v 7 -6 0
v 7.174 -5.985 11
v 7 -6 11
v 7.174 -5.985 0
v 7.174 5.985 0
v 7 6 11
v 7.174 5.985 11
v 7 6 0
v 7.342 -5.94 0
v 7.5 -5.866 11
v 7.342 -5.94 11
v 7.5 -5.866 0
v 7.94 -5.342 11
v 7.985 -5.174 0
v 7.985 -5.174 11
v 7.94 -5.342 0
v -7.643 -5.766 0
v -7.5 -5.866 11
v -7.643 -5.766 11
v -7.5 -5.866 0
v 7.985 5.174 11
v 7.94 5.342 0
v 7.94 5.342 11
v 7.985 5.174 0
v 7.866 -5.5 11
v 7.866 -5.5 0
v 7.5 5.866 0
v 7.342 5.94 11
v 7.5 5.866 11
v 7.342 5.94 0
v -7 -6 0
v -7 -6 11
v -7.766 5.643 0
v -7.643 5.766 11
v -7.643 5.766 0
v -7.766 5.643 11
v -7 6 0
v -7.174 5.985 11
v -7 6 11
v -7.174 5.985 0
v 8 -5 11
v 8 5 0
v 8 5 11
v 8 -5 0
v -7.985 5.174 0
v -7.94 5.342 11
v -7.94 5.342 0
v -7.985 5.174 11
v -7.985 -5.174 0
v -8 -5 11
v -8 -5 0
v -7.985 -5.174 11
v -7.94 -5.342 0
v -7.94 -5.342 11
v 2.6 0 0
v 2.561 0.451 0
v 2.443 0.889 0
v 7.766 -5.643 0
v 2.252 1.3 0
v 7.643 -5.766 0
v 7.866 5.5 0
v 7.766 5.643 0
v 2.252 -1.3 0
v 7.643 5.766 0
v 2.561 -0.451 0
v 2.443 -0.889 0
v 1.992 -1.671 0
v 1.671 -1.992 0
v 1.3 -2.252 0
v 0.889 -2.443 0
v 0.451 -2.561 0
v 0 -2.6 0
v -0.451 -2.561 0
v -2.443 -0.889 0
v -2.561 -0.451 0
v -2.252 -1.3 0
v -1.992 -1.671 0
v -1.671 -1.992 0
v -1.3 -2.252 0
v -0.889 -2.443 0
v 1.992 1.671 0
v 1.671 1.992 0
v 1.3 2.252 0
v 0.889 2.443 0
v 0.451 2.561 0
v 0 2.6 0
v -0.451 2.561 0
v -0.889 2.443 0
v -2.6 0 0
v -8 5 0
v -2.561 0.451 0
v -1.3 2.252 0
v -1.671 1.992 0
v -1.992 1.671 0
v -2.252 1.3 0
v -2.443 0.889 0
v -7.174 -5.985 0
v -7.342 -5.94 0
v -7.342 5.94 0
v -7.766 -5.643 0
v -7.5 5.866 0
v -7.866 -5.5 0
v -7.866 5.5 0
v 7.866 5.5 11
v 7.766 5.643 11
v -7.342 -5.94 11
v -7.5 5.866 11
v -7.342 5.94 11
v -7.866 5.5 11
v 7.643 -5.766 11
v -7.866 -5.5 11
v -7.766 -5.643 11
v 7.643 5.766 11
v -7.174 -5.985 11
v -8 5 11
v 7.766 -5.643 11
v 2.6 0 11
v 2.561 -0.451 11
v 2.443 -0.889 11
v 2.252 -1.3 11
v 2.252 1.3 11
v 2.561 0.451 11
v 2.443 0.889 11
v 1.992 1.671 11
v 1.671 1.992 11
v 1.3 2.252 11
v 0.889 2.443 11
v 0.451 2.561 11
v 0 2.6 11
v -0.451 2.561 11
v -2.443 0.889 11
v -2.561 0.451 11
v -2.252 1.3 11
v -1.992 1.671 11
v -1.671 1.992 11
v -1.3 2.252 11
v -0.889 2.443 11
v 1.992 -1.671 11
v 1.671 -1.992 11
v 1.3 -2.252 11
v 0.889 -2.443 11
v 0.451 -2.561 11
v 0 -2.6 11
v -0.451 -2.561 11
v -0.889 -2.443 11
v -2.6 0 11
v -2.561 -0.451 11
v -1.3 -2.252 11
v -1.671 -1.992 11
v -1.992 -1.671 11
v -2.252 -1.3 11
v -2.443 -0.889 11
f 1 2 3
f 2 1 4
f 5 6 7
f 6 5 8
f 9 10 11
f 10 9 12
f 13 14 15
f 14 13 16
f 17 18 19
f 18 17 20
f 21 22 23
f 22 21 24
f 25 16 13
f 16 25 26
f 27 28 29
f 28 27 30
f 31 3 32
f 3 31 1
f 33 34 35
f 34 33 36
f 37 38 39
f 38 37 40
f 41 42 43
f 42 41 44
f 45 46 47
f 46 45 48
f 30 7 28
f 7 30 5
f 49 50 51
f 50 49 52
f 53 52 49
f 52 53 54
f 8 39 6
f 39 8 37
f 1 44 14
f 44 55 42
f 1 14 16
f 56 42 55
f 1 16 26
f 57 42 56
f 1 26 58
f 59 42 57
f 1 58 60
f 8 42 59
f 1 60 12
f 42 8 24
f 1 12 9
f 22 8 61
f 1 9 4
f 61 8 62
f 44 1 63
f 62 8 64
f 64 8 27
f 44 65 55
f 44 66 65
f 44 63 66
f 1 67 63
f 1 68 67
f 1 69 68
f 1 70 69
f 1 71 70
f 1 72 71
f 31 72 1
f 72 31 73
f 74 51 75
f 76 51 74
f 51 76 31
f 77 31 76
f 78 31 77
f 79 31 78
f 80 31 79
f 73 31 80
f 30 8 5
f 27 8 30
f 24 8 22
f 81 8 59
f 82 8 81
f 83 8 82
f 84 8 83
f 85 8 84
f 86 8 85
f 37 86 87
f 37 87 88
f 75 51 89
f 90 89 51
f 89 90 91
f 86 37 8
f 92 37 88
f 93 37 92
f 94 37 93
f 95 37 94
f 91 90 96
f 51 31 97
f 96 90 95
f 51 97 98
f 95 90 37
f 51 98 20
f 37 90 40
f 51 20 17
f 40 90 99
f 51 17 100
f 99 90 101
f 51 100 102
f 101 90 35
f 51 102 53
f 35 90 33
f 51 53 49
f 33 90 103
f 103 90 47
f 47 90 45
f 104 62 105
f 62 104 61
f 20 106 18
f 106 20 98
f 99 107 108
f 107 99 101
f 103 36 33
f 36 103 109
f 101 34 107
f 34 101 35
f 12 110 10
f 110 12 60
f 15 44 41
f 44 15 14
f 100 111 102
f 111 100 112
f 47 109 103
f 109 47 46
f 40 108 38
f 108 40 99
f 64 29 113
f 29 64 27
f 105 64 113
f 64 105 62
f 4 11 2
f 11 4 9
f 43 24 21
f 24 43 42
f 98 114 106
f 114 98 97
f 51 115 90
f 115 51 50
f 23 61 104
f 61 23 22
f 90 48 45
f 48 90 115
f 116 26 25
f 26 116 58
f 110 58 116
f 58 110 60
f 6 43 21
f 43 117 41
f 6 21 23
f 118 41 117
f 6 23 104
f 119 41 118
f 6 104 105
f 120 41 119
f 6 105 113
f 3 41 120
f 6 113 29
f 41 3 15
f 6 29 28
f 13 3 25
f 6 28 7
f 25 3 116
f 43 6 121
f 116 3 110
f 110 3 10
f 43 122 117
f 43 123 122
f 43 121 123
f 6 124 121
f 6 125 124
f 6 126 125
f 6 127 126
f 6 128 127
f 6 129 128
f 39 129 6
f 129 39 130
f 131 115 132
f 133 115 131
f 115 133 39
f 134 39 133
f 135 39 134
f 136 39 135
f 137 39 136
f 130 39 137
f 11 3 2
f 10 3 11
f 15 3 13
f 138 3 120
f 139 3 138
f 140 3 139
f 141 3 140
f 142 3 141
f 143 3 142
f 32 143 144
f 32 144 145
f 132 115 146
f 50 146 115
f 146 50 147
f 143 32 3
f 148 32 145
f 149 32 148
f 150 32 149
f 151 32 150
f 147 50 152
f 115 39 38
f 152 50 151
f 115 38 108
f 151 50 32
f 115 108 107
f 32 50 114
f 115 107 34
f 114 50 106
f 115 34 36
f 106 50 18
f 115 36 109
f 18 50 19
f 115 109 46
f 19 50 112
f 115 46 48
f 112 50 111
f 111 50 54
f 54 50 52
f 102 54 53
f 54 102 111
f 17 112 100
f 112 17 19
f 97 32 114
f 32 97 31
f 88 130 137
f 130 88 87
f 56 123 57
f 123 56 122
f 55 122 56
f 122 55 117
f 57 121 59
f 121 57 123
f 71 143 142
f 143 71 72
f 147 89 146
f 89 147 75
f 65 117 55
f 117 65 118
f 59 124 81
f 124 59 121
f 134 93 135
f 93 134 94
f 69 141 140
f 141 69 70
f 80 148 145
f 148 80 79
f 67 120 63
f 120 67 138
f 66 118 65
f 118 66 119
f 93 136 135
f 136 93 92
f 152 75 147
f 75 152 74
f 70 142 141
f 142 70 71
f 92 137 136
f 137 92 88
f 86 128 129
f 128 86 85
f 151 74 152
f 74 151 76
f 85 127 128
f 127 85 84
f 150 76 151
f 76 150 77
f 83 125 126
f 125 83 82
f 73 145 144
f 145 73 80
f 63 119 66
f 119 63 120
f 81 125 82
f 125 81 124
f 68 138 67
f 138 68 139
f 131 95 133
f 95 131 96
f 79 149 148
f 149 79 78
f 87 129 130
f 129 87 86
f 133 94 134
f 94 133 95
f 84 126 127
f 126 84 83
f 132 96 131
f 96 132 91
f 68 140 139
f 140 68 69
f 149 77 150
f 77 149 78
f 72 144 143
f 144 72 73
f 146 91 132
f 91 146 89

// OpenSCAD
/*
 * Copyright ©2015 Laurence Gonsalves <laurence@xenomachina.com>
 *
 * This library is free software; you can redistribute it and/or
 * modify it under the terms of the GNU Lesser General Public
 * License as published by the Free Software Foundation; either
 * version 2.1 of the License, or any later version.
 *
 * This library is distributed in the hope that it will be useful,
 * but WITHOUT ANY WARRANTY; without even the implied warranty of
 * MERCHANTABILITY or FITNESS FOR A PARTICULAR PURPOSE.  See the GNU
 * Lesser General Public License for more details.
 *
 * You should have received a copy of the GNU Lesser General Public
 * License along with this library; if not, write to:
 *   Free Software Foundation, Inc.
 *   51 Franklin Street, Fifth Floor
 *   Boston, MA  02110-1301
 *   USA
 */

$fn=36;

h=11;
screw_hole_r = (4.7+.5)/2;
width=16;
depth=12;
bevel_r = 1;

module main() {
    difference() {
        hull()
            for(i=[-1,1])
            for(j=[-1,1])
            translate([(width/2-bevel_r) * i, (depth/2-bevel_r) * j, 0])
            cylinder(r=bevel_r, h=h);
        cylinder(r=screw_hole_r, h);
    }
}

// To generate a 4x4 grid of spacers, uncomment the following.
/*
for(i=[0:3])
    for(j=[0:3])
        translate([(width+1)*i, (depth+1)*j, 0])
            if(i*4+j<14)
*/

main();
